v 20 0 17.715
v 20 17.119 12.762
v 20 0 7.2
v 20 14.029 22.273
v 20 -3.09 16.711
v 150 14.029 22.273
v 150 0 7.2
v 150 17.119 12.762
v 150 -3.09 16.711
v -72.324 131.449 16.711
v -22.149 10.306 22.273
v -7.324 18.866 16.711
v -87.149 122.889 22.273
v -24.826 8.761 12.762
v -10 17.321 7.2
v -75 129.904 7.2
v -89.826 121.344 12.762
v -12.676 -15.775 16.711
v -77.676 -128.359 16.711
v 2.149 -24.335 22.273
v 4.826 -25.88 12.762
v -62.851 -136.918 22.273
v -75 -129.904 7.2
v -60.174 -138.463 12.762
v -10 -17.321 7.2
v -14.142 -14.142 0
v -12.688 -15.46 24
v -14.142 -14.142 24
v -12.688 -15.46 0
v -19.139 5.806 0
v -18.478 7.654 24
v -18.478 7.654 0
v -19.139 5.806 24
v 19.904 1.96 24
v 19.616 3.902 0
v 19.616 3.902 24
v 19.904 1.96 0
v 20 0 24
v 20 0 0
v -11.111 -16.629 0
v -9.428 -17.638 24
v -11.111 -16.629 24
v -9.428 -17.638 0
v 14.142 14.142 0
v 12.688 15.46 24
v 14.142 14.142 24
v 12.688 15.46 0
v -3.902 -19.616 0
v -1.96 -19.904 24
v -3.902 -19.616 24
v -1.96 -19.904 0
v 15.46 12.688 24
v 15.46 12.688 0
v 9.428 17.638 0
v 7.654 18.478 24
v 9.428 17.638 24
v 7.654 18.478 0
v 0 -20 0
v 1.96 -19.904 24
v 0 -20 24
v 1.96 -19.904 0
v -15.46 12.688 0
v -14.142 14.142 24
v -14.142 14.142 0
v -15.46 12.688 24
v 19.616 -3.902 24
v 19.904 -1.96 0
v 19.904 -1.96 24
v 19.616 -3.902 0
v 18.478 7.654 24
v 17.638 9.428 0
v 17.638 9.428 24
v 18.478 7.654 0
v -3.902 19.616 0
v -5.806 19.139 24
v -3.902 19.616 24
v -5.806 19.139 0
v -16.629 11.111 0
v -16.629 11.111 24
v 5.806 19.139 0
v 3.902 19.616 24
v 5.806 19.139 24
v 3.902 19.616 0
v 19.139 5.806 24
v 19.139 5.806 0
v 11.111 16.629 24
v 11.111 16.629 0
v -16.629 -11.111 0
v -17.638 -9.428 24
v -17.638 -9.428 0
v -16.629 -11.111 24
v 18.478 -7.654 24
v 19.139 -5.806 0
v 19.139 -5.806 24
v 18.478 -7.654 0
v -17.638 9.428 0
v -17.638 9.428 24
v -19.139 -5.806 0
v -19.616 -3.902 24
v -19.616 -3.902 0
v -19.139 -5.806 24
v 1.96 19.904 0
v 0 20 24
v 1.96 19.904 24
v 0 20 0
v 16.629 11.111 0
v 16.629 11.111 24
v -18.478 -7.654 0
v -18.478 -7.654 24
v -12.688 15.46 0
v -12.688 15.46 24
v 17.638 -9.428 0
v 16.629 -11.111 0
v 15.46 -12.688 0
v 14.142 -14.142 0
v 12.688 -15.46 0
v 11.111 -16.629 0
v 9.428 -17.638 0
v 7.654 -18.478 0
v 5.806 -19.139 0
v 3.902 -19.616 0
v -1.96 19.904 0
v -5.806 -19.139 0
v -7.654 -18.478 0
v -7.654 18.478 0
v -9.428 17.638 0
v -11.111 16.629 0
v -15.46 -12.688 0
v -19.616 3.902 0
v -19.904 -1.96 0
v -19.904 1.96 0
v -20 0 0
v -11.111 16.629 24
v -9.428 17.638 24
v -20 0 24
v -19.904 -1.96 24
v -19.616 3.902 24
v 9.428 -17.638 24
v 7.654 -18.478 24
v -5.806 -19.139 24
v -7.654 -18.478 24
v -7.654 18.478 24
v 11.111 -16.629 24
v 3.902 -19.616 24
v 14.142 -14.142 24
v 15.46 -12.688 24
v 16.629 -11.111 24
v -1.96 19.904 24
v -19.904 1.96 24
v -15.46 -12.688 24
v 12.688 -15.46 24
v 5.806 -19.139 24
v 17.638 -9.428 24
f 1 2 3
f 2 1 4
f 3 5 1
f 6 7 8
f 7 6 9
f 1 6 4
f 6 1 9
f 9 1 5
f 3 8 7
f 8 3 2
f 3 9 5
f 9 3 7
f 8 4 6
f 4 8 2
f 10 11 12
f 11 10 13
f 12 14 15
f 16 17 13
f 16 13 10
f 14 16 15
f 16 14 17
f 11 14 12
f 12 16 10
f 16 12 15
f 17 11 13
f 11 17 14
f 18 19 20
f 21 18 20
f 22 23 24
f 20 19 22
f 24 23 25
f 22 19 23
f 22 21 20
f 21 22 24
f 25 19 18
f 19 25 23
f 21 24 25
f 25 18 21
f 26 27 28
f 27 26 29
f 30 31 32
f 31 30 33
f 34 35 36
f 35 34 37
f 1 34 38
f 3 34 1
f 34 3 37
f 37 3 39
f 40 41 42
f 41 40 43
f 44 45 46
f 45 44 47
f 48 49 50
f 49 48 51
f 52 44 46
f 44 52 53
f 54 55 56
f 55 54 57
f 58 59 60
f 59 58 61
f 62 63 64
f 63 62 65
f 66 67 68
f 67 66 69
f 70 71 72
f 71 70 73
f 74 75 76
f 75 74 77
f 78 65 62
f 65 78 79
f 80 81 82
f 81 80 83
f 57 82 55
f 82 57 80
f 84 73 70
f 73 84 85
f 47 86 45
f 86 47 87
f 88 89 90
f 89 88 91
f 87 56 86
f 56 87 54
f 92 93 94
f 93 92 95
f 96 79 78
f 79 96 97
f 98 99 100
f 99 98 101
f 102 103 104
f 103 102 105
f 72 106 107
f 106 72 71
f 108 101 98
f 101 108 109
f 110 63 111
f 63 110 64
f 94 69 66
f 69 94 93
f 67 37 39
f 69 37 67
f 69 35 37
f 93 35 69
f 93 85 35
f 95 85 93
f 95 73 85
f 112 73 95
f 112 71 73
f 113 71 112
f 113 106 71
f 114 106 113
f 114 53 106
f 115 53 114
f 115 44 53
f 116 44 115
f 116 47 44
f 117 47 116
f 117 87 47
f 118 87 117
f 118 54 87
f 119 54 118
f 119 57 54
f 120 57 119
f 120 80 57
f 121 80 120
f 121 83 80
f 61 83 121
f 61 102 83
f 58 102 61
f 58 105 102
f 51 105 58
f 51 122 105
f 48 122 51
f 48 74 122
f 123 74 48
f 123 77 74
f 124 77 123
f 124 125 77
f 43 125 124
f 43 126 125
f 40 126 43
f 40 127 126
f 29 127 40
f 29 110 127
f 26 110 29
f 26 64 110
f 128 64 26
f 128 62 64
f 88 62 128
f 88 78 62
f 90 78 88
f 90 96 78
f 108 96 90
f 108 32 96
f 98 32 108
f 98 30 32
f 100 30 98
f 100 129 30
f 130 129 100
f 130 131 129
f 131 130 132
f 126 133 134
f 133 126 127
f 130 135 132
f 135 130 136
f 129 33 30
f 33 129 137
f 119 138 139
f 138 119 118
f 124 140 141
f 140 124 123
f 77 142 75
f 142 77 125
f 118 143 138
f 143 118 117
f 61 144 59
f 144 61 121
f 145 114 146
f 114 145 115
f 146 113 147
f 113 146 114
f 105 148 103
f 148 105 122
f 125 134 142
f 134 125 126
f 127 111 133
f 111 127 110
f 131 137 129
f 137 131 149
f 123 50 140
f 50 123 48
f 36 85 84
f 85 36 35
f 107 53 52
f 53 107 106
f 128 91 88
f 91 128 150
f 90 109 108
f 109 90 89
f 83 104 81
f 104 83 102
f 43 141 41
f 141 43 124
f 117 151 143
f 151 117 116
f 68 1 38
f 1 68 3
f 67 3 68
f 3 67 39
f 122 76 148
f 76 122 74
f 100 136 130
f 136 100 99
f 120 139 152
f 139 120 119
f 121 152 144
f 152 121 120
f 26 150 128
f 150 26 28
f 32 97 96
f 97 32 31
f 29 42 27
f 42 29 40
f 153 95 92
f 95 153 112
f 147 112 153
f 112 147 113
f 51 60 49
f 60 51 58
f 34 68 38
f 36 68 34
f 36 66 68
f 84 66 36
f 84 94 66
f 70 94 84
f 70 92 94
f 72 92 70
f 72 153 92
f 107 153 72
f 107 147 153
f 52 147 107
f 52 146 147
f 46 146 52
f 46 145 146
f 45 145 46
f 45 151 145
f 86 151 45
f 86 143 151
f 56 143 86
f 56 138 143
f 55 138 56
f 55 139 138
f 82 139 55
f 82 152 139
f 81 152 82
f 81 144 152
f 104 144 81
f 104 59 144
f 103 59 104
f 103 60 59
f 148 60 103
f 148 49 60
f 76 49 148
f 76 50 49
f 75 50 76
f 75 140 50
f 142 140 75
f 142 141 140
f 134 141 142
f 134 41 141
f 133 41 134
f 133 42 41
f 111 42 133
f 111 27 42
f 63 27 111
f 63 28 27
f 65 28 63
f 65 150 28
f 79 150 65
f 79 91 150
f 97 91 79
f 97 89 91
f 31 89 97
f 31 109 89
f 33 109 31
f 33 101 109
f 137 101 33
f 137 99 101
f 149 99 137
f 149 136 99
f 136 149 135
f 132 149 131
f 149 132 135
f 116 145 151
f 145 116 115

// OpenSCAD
// Generated by Text-to-CAD from prompt:
// a 3 blade propeller 300 mm diameter
$fn = 64;

module Propeller() {
cylinder(h=24, r=20, $fn=$fn);
for (i = [0 : 2]) rotate([0, 0, 360.0 / 3 * i]) {
    translate([20, 0, 7.2]) rotate(a=18, v=[1, 0, 0]) {
        cube([130, 18, 10]);
    }
}
}

Propeller();
